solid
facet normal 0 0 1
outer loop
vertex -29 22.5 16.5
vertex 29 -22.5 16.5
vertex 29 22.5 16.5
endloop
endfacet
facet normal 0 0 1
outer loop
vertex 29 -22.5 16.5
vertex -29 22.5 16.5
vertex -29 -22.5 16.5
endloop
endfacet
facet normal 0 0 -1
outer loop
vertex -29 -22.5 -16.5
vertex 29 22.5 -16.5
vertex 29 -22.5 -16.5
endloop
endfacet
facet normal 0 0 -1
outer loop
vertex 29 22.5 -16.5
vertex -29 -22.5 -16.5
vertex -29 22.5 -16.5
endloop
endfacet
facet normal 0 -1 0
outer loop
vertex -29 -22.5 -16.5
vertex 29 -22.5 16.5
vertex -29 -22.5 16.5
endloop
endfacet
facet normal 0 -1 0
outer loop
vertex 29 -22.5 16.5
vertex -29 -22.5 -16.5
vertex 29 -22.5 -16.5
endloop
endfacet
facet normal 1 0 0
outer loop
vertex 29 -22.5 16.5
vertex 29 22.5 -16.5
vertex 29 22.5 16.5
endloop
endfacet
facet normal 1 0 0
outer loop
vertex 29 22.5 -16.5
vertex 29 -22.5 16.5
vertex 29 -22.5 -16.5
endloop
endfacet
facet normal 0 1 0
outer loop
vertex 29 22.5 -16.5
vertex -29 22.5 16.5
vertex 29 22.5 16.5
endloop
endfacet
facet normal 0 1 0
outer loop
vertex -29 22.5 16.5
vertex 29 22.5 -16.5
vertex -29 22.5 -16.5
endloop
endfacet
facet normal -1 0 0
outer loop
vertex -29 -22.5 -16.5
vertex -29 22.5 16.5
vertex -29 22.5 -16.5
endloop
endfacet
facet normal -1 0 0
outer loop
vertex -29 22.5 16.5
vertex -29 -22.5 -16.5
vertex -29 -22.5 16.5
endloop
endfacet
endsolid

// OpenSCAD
// Parameters
length = 58; //[29:116:1]
width = 45; //[22.5:90:1]
height = 33; //[16.5:66:1]
corner_radius = 0; //[0:6:0.5]
mounting_holes = 0; //[0:1:1]
terminal_features = 0; //[0:1:1]
eps = 1; //[0.5:2:0.5]

// Solid State Relay (SSR) Module - Simplified Block
module mod() {
  color([0.85, 0.85, 0.8]) { // Off-white color for SSR module
    cube([length, width, height], center=true);
  }
}

// Assembly
module assembly() {
  mod();
}

assembly();
